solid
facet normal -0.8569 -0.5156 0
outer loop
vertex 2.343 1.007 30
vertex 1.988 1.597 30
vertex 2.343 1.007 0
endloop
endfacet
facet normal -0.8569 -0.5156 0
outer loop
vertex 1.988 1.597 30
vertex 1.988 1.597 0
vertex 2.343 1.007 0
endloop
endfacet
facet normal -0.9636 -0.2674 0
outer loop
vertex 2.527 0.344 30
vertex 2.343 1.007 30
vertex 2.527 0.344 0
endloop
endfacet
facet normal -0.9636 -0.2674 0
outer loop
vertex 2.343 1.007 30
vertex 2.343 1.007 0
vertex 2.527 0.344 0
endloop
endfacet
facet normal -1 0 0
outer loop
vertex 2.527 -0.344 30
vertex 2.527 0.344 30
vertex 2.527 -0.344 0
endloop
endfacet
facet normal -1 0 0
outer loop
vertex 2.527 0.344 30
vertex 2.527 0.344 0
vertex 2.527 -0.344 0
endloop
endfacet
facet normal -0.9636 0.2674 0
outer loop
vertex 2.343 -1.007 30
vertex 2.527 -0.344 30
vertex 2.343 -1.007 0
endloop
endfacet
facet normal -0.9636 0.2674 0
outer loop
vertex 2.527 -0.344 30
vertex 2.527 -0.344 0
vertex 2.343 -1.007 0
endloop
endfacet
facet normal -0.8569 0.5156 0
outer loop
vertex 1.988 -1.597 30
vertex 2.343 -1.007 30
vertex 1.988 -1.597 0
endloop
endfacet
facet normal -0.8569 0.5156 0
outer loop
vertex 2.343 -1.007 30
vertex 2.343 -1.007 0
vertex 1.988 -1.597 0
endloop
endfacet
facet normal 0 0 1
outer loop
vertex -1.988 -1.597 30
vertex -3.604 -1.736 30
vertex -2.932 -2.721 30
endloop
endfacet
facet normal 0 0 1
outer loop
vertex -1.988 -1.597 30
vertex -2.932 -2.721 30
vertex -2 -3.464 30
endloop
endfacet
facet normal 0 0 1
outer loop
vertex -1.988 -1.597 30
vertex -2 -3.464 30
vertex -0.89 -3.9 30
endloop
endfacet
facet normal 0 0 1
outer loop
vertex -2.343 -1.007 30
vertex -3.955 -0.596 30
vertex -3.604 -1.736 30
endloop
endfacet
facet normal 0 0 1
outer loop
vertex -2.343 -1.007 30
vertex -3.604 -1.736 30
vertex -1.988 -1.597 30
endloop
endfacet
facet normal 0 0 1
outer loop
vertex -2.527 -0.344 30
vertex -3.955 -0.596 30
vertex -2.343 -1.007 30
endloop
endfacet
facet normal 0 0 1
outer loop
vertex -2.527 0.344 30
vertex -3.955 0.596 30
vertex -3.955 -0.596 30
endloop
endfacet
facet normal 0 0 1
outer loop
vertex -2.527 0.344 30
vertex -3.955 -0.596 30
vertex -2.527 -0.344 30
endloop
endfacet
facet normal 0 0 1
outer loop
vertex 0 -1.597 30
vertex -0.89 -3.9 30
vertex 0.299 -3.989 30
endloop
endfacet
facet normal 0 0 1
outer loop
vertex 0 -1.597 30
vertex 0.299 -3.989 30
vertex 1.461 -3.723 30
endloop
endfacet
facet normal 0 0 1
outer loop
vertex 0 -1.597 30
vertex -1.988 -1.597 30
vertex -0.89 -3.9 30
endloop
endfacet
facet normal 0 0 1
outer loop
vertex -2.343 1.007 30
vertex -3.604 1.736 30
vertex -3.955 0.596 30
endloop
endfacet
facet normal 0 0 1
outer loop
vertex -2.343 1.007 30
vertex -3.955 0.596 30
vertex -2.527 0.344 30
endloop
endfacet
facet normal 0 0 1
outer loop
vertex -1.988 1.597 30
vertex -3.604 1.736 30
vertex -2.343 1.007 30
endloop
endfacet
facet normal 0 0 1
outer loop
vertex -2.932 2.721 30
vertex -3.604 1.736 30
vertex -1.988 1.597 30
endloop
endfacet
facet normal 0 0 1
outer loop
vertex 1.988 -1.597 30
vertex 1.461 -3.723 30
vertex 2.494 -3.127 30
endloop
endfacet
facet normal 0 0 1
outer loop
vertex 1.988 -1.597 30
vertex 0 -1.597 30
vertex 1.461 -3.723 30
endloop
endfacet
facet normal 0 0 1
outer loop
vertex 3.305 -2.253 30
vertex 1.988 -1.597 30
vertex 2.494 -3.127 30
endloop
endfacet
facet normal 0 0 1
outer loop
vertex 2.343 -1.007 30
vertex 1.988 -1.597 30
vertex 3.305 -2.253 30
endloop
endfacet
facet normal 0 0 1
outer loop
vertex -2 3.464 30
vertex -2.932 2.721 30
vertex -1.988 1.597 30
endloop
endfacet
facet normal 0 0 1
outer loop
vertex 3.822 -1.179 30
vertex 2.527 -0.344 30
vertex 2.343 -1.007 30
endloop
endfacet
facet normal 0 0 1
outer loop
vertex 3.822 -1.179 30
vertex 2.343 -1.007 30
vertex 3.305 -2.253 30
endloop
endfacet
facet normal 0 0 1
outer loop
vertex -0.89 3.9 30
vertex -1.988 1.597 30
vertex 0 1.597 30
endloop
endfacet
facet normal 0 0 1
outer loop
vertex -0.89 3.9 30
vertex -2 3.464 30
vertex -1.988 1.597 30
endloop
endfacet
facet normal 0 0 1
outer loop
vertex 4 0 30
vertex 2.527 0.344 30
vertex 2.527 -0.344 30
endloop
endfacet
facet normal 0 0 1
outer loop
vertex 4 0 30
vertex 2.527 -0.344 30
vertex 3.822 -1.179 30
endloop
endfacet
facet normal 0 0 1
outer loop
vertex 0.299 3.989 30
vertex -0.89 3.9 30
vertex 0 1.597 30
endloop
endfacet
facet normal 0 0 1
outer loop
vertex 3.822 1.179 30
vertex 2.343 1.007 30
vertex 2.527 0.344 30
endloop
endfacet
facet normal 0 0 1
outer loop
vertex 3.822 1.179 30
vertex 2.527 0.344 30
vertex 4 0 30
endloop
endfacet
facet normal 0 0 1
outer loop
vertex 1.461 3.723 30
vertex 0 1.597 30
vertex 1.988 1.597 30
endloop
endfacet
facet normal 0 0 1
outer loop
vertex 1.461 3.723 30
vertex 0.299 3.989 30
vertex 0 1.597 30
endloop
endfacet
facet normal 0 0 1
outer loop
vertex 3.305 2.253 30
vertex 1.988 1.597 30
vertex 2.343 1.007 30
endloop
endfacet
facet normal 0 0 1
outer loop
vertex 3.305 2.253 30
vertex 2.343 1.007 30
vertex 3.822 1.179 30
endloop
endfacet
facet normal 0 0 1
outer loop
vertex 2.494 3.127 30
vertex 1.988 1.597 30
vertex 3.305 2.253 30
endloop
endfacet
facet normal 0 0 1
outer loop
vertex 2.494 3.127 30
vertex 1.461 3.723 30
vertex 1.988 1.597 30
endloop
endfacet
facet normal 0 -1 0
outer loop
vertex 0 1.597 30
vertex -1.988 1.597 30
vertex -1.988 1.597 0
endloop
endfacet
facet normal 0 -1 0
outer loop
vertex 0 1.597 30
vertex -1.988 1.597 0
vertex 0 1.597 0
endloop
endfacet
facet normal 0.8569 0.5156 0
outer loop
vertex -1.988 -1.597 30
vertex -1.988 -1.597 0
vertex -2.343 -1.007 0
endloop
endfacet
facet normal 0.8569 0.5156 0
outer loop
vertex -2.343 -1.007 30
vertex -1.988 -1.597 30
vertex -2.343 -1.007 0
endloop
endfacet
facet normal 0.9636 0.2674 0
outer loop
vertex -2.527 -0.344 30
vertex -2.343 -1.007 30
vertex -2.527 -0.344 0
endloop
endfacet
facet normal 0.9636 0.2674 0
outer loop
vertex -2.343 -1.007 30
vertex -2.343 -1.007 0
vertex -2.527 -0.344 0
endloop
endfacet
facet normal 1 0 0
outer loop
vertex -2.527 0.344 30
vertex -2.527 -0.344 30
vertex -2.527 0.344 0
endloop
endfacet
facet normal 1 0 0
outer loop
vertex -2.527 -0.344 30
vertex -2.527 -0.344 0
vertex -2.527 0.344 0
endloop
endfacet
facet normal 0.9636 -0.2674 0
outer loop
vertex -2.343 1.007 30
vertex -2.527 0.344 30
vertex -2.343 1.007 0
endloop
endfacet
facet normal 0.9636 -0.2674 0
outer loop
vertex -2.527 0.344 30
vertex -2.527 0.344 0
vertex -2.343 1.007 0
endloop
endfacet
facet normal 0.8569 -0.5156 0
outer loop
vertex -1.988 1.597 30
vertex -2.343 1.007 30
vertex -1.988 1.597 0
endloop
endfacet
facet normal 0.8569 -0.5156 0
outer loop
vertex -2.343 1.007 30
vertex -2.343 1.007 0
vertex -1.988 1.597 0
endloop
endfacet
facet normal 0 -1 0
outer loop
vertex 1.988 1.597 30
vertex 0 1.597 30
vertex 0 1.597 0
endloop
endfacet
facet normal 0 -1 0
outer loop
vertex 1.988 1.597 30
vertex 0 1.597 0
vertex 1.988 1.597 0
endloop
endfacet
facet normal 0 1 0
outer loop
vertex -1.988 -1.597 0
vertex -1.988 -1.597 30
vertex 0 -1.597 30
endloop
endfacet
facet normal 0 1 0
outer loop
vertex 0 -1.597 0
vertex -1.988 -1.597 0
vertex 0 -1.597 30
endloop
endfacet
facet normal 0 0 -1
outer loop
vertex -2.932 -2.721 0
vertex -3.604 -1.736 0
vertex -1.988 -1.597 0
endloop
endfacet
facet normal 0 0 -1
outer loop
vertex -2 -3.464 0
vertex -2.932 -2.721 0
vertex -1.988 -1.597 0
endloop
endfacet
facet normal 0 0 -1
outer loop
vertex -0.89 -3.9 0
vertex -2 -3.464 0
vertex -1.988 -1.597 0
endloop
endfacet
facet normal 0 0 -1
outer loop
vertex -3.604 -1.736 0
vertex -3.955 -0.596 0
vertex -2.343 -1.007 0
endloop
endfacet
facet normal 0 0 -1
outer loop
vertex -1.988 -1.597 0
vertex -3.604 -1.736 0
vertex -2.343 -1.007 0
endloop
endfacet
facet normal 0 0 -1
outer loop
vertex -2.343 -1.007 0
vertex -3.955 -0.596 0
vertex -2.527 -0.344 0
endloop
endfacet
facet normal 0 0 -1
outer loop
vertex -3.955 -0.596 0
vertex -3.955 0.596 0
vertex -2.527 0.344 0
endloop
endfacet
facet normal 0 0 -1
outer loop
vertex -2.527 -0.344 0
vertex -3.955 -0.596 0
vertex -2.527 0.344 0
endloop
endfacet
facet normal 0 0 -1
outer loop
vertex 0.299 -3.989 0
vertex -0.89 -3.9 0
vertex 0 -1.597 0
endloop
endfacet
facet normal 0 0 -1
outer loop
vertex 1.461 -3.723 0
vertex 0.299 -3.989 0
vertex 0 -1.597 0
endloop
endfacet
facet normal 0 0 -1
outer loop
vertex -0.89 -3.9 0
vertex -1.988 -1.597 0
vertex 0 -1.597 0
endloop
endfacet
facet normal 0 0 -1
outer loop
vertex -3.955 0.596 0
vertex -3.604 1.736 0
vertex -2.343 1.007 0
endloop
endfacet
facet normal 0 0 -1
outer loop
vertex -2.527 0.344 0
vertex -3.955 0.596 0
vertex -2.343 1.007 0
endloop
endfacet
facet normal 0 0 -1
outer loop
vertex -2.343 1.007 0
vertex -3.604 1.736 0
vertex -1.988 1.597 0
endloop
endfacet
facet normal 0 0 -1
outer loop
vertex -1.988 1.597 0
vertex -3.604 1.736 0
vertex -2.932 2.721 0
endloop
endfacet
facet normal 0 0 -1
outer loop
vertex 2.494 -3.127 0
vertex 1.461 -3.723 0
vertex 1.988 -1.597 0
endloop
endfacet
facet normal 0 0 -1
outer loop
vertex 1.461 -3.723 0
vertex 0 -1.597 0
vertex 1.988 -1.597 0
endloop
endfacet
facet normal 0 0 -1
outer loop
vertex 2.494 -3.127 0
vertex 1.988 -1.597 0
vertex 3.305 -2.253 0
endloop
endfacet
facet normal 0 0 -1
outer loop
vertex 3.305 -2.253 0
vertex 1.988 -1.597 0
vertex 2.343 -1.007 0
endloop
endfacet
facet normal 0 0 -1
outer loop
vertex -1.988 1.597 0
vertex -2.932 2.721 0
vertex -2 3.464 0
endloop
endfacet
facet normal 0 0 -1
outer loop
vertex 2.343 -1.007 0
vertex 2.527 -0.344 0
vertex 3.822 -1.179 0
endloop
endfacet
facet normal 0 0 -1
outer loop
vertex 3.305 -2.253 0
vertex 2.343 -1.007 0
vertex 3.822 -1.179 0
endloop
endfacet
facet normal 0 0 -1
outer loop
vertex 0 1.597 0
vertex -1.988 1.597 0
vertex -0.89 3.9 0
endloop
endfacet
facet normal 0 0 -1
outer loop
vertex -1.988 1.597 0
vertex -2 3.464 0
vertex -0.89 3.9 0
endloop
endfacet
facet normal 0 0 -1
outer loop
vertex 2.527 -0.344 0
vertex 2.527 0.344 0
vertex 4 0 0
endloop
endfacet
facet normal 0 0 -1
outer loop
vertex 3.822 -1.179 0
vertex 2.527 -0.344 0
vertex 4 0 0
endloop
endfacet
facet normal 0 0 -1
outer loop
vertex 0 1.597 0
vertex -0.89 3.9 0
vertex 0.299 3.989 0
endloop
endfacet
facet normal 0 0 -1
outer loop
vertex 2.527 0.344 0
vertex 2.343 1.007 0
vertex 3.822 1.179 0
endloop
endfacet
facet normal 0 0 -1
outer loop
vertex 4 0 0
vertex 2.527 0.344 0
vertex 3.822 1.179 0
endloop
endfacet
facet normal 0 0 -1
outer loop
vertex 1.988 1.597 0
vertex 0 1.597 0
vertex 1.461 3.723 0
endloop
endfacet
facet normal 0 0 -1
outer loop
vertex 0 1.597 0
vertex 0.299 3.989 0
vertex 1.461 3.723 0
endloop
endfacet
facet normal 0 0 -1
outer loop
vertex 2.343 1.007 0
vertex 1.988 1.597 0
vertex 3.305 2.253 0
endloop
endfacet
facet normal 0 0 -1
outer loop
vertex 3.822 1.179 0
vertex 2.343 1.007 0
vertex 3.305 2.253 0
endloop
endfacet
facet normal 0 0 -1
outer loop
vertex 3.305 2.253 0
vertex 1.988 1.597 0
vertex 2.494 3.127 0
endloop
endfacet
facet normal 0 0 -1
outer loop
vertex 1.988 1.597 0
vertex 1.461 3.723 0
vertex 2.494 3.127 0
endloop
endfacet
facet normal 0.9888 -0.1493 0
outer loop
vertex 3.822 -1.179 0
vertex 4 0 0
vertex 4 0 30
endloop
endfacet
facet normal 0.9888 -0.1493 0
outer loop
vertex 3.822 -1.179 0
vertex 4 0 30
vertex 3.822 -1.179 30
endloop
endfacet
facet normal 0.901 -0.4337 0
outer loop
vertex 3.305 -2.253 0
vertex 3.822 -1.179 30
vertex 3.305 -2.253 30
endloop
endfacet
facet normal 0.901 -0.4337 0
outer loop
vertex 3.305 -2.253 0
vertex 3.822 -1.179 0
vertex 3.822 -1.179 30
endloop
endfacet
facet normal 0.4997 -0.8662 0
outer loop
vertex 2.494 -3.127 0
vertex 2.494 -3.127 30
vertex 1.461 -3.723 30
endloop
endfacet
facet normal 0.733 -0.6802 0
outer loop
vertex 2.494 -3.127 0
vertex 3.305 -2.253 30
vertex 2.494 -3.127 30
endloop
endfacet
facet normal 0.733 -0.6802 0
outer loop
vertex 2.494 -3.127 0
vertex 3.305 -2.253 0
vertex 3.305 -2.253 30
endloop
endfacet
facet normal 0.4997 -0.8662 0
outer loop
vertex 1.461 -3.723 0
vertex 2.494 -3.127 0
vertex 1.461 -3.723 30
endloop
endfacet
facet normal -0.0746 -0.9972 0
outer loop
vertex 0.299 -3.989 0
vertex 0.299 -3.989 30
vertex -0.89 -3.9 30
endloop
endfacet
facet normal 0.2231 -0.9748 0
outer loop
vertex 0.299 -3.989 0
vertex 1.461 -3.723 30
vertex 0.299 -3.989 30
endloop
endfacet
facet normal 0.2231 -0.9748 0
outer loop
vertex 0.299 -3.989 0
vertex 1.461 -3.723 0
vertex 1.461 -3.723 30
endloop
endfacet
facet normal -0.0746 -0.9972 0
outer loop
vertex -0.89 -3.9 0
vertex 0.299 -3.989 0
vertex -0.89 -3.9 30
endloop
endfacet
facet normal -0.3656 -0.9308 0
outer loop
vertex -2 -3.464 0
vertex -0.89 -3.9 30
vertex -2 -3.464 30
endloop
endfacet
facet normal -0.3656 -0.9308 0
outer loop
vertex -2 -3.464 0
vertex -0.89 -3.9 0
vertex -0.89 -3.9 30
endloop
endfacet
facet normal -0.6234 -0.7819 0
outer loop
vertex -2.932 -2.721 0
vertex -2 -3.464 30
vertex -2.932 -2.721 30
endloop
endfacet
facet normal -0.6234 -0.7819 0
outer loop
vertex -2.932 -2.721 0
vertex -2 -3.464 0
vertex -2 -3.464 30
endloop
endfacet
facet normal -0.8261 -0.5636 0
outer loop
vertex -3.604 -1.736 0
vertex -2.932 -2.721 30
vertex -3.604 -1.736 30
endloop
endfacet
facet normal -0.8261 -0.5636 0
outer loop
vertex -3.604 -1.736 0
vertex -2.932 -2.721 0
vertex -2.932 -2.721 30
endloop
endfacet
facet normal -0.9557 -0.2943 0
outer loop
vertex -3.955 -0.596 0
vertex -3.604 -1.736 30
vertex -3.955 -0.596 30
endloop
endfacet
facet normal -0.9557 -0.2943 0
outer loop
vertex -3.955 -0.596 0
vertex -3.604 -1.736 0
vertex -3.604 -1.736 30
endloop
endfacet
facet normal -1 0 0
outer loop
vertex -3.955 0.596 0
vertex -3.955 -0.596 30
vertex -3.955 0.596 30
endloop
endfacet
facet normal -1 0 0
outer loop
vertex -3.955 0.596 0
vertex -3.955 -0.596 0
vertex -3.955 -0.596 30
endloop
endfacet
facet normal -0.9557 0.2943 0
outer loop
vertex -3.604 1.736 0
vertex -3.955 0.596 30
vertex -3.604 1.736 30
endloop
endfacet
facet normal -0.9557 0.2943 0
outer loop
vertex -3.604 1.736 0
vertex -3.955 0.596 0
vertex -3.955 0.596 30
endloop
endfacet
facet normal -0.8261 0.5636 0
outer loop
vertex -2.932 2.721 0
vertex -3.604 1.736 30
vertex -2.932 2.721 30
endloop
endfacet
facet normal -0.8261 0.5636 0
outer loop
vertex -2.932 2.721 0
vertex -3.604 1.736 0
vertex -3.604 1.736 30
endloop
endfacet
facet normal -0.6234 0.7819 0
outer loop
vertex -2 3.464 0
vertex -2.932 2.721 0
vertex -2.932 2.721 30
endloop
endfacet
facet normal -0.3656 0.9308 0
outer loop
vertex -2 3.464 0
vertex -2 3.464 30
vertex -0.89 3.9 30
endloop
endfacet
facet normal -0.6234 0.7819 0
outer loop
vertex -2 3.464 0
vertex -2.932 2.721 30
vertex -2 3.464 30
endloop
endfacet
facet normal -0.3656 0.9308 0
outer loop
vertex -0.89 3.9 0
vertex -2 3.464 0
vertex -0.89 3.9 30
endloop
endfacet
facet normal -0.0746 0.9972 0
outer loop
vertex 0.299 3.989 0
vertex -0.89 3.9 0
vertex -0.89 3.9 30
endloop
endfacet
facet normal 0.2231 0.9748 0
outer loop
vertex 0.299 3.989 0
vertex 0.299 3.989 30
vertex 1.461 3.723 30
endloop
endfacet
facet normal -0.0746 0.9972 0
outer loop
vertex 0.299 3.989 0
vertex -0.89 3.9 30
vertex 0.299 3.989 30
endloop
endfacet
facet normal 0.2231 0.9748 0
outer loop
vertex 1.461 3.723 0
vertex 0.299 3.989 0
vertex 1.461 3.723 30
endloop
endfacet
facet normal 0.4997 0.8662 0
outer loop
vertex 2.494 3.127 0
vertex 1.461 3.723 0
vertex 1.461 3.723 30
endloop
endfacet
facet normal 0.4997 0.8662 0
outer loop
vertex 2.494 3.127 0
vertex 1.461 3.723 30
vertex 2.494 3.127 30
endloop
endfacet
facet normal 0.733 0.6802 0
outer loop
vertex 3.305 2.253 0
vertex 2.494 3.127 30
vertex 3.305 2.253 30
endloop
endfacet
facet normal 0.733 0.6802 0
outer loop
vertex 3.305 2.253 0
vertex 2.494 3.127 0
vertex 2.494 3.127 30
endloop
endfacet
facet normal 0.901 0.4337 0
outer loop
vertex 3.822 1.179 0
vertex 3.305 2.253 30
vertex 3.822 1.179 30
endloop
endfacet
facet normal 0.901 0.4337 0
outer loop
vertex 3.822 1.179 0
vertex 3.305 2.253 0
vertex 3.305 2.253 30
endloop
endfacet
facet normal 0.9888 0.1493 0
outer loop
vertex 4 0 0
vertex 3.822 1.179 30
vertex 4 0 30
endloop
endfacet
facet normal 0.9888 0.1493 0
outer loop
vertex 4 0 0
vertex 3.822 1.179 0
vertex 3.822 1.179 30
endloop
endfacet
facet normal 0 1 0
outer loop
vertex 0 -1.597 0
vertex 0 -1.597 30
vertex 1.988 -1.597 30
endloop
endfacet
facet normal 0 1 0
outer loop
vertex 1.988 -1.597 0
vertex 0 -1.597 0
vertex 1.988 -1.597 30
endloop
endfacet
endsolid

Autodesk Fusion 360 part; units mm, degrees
sketch "Sketch1" plane through (0, 0, 0) normal (0, 0, 1) x (1, 0, 0)
  circle A0 centre (0, 0) radius 4
  line L0 (0, 0) -> (0, 1.6)
  line L1 (0, 0) -> (0, -1.6)
  line L2 (-1.9879, 1.5971) -> (1.9879, 1.5971)
  line L3 (-1.9878, -1.5972) -> (1.9878, -1.5972)
  arc A1 (-1.9879, 1.5971) -> (-1.9878, -1.5972) centre (0, 0) ccw
  arc A2 (1.9878, -1.5972) -> (1.9879, 1.5971) centre (0, 0) ccw
  dimension "d1" = 8
  dimension "d2" = 5.1
  dimension "d3" = 1.6
  dimension "d4" = 1.6
extrude "Extrude1" add sketch "Sketch1" along normal blind 30
